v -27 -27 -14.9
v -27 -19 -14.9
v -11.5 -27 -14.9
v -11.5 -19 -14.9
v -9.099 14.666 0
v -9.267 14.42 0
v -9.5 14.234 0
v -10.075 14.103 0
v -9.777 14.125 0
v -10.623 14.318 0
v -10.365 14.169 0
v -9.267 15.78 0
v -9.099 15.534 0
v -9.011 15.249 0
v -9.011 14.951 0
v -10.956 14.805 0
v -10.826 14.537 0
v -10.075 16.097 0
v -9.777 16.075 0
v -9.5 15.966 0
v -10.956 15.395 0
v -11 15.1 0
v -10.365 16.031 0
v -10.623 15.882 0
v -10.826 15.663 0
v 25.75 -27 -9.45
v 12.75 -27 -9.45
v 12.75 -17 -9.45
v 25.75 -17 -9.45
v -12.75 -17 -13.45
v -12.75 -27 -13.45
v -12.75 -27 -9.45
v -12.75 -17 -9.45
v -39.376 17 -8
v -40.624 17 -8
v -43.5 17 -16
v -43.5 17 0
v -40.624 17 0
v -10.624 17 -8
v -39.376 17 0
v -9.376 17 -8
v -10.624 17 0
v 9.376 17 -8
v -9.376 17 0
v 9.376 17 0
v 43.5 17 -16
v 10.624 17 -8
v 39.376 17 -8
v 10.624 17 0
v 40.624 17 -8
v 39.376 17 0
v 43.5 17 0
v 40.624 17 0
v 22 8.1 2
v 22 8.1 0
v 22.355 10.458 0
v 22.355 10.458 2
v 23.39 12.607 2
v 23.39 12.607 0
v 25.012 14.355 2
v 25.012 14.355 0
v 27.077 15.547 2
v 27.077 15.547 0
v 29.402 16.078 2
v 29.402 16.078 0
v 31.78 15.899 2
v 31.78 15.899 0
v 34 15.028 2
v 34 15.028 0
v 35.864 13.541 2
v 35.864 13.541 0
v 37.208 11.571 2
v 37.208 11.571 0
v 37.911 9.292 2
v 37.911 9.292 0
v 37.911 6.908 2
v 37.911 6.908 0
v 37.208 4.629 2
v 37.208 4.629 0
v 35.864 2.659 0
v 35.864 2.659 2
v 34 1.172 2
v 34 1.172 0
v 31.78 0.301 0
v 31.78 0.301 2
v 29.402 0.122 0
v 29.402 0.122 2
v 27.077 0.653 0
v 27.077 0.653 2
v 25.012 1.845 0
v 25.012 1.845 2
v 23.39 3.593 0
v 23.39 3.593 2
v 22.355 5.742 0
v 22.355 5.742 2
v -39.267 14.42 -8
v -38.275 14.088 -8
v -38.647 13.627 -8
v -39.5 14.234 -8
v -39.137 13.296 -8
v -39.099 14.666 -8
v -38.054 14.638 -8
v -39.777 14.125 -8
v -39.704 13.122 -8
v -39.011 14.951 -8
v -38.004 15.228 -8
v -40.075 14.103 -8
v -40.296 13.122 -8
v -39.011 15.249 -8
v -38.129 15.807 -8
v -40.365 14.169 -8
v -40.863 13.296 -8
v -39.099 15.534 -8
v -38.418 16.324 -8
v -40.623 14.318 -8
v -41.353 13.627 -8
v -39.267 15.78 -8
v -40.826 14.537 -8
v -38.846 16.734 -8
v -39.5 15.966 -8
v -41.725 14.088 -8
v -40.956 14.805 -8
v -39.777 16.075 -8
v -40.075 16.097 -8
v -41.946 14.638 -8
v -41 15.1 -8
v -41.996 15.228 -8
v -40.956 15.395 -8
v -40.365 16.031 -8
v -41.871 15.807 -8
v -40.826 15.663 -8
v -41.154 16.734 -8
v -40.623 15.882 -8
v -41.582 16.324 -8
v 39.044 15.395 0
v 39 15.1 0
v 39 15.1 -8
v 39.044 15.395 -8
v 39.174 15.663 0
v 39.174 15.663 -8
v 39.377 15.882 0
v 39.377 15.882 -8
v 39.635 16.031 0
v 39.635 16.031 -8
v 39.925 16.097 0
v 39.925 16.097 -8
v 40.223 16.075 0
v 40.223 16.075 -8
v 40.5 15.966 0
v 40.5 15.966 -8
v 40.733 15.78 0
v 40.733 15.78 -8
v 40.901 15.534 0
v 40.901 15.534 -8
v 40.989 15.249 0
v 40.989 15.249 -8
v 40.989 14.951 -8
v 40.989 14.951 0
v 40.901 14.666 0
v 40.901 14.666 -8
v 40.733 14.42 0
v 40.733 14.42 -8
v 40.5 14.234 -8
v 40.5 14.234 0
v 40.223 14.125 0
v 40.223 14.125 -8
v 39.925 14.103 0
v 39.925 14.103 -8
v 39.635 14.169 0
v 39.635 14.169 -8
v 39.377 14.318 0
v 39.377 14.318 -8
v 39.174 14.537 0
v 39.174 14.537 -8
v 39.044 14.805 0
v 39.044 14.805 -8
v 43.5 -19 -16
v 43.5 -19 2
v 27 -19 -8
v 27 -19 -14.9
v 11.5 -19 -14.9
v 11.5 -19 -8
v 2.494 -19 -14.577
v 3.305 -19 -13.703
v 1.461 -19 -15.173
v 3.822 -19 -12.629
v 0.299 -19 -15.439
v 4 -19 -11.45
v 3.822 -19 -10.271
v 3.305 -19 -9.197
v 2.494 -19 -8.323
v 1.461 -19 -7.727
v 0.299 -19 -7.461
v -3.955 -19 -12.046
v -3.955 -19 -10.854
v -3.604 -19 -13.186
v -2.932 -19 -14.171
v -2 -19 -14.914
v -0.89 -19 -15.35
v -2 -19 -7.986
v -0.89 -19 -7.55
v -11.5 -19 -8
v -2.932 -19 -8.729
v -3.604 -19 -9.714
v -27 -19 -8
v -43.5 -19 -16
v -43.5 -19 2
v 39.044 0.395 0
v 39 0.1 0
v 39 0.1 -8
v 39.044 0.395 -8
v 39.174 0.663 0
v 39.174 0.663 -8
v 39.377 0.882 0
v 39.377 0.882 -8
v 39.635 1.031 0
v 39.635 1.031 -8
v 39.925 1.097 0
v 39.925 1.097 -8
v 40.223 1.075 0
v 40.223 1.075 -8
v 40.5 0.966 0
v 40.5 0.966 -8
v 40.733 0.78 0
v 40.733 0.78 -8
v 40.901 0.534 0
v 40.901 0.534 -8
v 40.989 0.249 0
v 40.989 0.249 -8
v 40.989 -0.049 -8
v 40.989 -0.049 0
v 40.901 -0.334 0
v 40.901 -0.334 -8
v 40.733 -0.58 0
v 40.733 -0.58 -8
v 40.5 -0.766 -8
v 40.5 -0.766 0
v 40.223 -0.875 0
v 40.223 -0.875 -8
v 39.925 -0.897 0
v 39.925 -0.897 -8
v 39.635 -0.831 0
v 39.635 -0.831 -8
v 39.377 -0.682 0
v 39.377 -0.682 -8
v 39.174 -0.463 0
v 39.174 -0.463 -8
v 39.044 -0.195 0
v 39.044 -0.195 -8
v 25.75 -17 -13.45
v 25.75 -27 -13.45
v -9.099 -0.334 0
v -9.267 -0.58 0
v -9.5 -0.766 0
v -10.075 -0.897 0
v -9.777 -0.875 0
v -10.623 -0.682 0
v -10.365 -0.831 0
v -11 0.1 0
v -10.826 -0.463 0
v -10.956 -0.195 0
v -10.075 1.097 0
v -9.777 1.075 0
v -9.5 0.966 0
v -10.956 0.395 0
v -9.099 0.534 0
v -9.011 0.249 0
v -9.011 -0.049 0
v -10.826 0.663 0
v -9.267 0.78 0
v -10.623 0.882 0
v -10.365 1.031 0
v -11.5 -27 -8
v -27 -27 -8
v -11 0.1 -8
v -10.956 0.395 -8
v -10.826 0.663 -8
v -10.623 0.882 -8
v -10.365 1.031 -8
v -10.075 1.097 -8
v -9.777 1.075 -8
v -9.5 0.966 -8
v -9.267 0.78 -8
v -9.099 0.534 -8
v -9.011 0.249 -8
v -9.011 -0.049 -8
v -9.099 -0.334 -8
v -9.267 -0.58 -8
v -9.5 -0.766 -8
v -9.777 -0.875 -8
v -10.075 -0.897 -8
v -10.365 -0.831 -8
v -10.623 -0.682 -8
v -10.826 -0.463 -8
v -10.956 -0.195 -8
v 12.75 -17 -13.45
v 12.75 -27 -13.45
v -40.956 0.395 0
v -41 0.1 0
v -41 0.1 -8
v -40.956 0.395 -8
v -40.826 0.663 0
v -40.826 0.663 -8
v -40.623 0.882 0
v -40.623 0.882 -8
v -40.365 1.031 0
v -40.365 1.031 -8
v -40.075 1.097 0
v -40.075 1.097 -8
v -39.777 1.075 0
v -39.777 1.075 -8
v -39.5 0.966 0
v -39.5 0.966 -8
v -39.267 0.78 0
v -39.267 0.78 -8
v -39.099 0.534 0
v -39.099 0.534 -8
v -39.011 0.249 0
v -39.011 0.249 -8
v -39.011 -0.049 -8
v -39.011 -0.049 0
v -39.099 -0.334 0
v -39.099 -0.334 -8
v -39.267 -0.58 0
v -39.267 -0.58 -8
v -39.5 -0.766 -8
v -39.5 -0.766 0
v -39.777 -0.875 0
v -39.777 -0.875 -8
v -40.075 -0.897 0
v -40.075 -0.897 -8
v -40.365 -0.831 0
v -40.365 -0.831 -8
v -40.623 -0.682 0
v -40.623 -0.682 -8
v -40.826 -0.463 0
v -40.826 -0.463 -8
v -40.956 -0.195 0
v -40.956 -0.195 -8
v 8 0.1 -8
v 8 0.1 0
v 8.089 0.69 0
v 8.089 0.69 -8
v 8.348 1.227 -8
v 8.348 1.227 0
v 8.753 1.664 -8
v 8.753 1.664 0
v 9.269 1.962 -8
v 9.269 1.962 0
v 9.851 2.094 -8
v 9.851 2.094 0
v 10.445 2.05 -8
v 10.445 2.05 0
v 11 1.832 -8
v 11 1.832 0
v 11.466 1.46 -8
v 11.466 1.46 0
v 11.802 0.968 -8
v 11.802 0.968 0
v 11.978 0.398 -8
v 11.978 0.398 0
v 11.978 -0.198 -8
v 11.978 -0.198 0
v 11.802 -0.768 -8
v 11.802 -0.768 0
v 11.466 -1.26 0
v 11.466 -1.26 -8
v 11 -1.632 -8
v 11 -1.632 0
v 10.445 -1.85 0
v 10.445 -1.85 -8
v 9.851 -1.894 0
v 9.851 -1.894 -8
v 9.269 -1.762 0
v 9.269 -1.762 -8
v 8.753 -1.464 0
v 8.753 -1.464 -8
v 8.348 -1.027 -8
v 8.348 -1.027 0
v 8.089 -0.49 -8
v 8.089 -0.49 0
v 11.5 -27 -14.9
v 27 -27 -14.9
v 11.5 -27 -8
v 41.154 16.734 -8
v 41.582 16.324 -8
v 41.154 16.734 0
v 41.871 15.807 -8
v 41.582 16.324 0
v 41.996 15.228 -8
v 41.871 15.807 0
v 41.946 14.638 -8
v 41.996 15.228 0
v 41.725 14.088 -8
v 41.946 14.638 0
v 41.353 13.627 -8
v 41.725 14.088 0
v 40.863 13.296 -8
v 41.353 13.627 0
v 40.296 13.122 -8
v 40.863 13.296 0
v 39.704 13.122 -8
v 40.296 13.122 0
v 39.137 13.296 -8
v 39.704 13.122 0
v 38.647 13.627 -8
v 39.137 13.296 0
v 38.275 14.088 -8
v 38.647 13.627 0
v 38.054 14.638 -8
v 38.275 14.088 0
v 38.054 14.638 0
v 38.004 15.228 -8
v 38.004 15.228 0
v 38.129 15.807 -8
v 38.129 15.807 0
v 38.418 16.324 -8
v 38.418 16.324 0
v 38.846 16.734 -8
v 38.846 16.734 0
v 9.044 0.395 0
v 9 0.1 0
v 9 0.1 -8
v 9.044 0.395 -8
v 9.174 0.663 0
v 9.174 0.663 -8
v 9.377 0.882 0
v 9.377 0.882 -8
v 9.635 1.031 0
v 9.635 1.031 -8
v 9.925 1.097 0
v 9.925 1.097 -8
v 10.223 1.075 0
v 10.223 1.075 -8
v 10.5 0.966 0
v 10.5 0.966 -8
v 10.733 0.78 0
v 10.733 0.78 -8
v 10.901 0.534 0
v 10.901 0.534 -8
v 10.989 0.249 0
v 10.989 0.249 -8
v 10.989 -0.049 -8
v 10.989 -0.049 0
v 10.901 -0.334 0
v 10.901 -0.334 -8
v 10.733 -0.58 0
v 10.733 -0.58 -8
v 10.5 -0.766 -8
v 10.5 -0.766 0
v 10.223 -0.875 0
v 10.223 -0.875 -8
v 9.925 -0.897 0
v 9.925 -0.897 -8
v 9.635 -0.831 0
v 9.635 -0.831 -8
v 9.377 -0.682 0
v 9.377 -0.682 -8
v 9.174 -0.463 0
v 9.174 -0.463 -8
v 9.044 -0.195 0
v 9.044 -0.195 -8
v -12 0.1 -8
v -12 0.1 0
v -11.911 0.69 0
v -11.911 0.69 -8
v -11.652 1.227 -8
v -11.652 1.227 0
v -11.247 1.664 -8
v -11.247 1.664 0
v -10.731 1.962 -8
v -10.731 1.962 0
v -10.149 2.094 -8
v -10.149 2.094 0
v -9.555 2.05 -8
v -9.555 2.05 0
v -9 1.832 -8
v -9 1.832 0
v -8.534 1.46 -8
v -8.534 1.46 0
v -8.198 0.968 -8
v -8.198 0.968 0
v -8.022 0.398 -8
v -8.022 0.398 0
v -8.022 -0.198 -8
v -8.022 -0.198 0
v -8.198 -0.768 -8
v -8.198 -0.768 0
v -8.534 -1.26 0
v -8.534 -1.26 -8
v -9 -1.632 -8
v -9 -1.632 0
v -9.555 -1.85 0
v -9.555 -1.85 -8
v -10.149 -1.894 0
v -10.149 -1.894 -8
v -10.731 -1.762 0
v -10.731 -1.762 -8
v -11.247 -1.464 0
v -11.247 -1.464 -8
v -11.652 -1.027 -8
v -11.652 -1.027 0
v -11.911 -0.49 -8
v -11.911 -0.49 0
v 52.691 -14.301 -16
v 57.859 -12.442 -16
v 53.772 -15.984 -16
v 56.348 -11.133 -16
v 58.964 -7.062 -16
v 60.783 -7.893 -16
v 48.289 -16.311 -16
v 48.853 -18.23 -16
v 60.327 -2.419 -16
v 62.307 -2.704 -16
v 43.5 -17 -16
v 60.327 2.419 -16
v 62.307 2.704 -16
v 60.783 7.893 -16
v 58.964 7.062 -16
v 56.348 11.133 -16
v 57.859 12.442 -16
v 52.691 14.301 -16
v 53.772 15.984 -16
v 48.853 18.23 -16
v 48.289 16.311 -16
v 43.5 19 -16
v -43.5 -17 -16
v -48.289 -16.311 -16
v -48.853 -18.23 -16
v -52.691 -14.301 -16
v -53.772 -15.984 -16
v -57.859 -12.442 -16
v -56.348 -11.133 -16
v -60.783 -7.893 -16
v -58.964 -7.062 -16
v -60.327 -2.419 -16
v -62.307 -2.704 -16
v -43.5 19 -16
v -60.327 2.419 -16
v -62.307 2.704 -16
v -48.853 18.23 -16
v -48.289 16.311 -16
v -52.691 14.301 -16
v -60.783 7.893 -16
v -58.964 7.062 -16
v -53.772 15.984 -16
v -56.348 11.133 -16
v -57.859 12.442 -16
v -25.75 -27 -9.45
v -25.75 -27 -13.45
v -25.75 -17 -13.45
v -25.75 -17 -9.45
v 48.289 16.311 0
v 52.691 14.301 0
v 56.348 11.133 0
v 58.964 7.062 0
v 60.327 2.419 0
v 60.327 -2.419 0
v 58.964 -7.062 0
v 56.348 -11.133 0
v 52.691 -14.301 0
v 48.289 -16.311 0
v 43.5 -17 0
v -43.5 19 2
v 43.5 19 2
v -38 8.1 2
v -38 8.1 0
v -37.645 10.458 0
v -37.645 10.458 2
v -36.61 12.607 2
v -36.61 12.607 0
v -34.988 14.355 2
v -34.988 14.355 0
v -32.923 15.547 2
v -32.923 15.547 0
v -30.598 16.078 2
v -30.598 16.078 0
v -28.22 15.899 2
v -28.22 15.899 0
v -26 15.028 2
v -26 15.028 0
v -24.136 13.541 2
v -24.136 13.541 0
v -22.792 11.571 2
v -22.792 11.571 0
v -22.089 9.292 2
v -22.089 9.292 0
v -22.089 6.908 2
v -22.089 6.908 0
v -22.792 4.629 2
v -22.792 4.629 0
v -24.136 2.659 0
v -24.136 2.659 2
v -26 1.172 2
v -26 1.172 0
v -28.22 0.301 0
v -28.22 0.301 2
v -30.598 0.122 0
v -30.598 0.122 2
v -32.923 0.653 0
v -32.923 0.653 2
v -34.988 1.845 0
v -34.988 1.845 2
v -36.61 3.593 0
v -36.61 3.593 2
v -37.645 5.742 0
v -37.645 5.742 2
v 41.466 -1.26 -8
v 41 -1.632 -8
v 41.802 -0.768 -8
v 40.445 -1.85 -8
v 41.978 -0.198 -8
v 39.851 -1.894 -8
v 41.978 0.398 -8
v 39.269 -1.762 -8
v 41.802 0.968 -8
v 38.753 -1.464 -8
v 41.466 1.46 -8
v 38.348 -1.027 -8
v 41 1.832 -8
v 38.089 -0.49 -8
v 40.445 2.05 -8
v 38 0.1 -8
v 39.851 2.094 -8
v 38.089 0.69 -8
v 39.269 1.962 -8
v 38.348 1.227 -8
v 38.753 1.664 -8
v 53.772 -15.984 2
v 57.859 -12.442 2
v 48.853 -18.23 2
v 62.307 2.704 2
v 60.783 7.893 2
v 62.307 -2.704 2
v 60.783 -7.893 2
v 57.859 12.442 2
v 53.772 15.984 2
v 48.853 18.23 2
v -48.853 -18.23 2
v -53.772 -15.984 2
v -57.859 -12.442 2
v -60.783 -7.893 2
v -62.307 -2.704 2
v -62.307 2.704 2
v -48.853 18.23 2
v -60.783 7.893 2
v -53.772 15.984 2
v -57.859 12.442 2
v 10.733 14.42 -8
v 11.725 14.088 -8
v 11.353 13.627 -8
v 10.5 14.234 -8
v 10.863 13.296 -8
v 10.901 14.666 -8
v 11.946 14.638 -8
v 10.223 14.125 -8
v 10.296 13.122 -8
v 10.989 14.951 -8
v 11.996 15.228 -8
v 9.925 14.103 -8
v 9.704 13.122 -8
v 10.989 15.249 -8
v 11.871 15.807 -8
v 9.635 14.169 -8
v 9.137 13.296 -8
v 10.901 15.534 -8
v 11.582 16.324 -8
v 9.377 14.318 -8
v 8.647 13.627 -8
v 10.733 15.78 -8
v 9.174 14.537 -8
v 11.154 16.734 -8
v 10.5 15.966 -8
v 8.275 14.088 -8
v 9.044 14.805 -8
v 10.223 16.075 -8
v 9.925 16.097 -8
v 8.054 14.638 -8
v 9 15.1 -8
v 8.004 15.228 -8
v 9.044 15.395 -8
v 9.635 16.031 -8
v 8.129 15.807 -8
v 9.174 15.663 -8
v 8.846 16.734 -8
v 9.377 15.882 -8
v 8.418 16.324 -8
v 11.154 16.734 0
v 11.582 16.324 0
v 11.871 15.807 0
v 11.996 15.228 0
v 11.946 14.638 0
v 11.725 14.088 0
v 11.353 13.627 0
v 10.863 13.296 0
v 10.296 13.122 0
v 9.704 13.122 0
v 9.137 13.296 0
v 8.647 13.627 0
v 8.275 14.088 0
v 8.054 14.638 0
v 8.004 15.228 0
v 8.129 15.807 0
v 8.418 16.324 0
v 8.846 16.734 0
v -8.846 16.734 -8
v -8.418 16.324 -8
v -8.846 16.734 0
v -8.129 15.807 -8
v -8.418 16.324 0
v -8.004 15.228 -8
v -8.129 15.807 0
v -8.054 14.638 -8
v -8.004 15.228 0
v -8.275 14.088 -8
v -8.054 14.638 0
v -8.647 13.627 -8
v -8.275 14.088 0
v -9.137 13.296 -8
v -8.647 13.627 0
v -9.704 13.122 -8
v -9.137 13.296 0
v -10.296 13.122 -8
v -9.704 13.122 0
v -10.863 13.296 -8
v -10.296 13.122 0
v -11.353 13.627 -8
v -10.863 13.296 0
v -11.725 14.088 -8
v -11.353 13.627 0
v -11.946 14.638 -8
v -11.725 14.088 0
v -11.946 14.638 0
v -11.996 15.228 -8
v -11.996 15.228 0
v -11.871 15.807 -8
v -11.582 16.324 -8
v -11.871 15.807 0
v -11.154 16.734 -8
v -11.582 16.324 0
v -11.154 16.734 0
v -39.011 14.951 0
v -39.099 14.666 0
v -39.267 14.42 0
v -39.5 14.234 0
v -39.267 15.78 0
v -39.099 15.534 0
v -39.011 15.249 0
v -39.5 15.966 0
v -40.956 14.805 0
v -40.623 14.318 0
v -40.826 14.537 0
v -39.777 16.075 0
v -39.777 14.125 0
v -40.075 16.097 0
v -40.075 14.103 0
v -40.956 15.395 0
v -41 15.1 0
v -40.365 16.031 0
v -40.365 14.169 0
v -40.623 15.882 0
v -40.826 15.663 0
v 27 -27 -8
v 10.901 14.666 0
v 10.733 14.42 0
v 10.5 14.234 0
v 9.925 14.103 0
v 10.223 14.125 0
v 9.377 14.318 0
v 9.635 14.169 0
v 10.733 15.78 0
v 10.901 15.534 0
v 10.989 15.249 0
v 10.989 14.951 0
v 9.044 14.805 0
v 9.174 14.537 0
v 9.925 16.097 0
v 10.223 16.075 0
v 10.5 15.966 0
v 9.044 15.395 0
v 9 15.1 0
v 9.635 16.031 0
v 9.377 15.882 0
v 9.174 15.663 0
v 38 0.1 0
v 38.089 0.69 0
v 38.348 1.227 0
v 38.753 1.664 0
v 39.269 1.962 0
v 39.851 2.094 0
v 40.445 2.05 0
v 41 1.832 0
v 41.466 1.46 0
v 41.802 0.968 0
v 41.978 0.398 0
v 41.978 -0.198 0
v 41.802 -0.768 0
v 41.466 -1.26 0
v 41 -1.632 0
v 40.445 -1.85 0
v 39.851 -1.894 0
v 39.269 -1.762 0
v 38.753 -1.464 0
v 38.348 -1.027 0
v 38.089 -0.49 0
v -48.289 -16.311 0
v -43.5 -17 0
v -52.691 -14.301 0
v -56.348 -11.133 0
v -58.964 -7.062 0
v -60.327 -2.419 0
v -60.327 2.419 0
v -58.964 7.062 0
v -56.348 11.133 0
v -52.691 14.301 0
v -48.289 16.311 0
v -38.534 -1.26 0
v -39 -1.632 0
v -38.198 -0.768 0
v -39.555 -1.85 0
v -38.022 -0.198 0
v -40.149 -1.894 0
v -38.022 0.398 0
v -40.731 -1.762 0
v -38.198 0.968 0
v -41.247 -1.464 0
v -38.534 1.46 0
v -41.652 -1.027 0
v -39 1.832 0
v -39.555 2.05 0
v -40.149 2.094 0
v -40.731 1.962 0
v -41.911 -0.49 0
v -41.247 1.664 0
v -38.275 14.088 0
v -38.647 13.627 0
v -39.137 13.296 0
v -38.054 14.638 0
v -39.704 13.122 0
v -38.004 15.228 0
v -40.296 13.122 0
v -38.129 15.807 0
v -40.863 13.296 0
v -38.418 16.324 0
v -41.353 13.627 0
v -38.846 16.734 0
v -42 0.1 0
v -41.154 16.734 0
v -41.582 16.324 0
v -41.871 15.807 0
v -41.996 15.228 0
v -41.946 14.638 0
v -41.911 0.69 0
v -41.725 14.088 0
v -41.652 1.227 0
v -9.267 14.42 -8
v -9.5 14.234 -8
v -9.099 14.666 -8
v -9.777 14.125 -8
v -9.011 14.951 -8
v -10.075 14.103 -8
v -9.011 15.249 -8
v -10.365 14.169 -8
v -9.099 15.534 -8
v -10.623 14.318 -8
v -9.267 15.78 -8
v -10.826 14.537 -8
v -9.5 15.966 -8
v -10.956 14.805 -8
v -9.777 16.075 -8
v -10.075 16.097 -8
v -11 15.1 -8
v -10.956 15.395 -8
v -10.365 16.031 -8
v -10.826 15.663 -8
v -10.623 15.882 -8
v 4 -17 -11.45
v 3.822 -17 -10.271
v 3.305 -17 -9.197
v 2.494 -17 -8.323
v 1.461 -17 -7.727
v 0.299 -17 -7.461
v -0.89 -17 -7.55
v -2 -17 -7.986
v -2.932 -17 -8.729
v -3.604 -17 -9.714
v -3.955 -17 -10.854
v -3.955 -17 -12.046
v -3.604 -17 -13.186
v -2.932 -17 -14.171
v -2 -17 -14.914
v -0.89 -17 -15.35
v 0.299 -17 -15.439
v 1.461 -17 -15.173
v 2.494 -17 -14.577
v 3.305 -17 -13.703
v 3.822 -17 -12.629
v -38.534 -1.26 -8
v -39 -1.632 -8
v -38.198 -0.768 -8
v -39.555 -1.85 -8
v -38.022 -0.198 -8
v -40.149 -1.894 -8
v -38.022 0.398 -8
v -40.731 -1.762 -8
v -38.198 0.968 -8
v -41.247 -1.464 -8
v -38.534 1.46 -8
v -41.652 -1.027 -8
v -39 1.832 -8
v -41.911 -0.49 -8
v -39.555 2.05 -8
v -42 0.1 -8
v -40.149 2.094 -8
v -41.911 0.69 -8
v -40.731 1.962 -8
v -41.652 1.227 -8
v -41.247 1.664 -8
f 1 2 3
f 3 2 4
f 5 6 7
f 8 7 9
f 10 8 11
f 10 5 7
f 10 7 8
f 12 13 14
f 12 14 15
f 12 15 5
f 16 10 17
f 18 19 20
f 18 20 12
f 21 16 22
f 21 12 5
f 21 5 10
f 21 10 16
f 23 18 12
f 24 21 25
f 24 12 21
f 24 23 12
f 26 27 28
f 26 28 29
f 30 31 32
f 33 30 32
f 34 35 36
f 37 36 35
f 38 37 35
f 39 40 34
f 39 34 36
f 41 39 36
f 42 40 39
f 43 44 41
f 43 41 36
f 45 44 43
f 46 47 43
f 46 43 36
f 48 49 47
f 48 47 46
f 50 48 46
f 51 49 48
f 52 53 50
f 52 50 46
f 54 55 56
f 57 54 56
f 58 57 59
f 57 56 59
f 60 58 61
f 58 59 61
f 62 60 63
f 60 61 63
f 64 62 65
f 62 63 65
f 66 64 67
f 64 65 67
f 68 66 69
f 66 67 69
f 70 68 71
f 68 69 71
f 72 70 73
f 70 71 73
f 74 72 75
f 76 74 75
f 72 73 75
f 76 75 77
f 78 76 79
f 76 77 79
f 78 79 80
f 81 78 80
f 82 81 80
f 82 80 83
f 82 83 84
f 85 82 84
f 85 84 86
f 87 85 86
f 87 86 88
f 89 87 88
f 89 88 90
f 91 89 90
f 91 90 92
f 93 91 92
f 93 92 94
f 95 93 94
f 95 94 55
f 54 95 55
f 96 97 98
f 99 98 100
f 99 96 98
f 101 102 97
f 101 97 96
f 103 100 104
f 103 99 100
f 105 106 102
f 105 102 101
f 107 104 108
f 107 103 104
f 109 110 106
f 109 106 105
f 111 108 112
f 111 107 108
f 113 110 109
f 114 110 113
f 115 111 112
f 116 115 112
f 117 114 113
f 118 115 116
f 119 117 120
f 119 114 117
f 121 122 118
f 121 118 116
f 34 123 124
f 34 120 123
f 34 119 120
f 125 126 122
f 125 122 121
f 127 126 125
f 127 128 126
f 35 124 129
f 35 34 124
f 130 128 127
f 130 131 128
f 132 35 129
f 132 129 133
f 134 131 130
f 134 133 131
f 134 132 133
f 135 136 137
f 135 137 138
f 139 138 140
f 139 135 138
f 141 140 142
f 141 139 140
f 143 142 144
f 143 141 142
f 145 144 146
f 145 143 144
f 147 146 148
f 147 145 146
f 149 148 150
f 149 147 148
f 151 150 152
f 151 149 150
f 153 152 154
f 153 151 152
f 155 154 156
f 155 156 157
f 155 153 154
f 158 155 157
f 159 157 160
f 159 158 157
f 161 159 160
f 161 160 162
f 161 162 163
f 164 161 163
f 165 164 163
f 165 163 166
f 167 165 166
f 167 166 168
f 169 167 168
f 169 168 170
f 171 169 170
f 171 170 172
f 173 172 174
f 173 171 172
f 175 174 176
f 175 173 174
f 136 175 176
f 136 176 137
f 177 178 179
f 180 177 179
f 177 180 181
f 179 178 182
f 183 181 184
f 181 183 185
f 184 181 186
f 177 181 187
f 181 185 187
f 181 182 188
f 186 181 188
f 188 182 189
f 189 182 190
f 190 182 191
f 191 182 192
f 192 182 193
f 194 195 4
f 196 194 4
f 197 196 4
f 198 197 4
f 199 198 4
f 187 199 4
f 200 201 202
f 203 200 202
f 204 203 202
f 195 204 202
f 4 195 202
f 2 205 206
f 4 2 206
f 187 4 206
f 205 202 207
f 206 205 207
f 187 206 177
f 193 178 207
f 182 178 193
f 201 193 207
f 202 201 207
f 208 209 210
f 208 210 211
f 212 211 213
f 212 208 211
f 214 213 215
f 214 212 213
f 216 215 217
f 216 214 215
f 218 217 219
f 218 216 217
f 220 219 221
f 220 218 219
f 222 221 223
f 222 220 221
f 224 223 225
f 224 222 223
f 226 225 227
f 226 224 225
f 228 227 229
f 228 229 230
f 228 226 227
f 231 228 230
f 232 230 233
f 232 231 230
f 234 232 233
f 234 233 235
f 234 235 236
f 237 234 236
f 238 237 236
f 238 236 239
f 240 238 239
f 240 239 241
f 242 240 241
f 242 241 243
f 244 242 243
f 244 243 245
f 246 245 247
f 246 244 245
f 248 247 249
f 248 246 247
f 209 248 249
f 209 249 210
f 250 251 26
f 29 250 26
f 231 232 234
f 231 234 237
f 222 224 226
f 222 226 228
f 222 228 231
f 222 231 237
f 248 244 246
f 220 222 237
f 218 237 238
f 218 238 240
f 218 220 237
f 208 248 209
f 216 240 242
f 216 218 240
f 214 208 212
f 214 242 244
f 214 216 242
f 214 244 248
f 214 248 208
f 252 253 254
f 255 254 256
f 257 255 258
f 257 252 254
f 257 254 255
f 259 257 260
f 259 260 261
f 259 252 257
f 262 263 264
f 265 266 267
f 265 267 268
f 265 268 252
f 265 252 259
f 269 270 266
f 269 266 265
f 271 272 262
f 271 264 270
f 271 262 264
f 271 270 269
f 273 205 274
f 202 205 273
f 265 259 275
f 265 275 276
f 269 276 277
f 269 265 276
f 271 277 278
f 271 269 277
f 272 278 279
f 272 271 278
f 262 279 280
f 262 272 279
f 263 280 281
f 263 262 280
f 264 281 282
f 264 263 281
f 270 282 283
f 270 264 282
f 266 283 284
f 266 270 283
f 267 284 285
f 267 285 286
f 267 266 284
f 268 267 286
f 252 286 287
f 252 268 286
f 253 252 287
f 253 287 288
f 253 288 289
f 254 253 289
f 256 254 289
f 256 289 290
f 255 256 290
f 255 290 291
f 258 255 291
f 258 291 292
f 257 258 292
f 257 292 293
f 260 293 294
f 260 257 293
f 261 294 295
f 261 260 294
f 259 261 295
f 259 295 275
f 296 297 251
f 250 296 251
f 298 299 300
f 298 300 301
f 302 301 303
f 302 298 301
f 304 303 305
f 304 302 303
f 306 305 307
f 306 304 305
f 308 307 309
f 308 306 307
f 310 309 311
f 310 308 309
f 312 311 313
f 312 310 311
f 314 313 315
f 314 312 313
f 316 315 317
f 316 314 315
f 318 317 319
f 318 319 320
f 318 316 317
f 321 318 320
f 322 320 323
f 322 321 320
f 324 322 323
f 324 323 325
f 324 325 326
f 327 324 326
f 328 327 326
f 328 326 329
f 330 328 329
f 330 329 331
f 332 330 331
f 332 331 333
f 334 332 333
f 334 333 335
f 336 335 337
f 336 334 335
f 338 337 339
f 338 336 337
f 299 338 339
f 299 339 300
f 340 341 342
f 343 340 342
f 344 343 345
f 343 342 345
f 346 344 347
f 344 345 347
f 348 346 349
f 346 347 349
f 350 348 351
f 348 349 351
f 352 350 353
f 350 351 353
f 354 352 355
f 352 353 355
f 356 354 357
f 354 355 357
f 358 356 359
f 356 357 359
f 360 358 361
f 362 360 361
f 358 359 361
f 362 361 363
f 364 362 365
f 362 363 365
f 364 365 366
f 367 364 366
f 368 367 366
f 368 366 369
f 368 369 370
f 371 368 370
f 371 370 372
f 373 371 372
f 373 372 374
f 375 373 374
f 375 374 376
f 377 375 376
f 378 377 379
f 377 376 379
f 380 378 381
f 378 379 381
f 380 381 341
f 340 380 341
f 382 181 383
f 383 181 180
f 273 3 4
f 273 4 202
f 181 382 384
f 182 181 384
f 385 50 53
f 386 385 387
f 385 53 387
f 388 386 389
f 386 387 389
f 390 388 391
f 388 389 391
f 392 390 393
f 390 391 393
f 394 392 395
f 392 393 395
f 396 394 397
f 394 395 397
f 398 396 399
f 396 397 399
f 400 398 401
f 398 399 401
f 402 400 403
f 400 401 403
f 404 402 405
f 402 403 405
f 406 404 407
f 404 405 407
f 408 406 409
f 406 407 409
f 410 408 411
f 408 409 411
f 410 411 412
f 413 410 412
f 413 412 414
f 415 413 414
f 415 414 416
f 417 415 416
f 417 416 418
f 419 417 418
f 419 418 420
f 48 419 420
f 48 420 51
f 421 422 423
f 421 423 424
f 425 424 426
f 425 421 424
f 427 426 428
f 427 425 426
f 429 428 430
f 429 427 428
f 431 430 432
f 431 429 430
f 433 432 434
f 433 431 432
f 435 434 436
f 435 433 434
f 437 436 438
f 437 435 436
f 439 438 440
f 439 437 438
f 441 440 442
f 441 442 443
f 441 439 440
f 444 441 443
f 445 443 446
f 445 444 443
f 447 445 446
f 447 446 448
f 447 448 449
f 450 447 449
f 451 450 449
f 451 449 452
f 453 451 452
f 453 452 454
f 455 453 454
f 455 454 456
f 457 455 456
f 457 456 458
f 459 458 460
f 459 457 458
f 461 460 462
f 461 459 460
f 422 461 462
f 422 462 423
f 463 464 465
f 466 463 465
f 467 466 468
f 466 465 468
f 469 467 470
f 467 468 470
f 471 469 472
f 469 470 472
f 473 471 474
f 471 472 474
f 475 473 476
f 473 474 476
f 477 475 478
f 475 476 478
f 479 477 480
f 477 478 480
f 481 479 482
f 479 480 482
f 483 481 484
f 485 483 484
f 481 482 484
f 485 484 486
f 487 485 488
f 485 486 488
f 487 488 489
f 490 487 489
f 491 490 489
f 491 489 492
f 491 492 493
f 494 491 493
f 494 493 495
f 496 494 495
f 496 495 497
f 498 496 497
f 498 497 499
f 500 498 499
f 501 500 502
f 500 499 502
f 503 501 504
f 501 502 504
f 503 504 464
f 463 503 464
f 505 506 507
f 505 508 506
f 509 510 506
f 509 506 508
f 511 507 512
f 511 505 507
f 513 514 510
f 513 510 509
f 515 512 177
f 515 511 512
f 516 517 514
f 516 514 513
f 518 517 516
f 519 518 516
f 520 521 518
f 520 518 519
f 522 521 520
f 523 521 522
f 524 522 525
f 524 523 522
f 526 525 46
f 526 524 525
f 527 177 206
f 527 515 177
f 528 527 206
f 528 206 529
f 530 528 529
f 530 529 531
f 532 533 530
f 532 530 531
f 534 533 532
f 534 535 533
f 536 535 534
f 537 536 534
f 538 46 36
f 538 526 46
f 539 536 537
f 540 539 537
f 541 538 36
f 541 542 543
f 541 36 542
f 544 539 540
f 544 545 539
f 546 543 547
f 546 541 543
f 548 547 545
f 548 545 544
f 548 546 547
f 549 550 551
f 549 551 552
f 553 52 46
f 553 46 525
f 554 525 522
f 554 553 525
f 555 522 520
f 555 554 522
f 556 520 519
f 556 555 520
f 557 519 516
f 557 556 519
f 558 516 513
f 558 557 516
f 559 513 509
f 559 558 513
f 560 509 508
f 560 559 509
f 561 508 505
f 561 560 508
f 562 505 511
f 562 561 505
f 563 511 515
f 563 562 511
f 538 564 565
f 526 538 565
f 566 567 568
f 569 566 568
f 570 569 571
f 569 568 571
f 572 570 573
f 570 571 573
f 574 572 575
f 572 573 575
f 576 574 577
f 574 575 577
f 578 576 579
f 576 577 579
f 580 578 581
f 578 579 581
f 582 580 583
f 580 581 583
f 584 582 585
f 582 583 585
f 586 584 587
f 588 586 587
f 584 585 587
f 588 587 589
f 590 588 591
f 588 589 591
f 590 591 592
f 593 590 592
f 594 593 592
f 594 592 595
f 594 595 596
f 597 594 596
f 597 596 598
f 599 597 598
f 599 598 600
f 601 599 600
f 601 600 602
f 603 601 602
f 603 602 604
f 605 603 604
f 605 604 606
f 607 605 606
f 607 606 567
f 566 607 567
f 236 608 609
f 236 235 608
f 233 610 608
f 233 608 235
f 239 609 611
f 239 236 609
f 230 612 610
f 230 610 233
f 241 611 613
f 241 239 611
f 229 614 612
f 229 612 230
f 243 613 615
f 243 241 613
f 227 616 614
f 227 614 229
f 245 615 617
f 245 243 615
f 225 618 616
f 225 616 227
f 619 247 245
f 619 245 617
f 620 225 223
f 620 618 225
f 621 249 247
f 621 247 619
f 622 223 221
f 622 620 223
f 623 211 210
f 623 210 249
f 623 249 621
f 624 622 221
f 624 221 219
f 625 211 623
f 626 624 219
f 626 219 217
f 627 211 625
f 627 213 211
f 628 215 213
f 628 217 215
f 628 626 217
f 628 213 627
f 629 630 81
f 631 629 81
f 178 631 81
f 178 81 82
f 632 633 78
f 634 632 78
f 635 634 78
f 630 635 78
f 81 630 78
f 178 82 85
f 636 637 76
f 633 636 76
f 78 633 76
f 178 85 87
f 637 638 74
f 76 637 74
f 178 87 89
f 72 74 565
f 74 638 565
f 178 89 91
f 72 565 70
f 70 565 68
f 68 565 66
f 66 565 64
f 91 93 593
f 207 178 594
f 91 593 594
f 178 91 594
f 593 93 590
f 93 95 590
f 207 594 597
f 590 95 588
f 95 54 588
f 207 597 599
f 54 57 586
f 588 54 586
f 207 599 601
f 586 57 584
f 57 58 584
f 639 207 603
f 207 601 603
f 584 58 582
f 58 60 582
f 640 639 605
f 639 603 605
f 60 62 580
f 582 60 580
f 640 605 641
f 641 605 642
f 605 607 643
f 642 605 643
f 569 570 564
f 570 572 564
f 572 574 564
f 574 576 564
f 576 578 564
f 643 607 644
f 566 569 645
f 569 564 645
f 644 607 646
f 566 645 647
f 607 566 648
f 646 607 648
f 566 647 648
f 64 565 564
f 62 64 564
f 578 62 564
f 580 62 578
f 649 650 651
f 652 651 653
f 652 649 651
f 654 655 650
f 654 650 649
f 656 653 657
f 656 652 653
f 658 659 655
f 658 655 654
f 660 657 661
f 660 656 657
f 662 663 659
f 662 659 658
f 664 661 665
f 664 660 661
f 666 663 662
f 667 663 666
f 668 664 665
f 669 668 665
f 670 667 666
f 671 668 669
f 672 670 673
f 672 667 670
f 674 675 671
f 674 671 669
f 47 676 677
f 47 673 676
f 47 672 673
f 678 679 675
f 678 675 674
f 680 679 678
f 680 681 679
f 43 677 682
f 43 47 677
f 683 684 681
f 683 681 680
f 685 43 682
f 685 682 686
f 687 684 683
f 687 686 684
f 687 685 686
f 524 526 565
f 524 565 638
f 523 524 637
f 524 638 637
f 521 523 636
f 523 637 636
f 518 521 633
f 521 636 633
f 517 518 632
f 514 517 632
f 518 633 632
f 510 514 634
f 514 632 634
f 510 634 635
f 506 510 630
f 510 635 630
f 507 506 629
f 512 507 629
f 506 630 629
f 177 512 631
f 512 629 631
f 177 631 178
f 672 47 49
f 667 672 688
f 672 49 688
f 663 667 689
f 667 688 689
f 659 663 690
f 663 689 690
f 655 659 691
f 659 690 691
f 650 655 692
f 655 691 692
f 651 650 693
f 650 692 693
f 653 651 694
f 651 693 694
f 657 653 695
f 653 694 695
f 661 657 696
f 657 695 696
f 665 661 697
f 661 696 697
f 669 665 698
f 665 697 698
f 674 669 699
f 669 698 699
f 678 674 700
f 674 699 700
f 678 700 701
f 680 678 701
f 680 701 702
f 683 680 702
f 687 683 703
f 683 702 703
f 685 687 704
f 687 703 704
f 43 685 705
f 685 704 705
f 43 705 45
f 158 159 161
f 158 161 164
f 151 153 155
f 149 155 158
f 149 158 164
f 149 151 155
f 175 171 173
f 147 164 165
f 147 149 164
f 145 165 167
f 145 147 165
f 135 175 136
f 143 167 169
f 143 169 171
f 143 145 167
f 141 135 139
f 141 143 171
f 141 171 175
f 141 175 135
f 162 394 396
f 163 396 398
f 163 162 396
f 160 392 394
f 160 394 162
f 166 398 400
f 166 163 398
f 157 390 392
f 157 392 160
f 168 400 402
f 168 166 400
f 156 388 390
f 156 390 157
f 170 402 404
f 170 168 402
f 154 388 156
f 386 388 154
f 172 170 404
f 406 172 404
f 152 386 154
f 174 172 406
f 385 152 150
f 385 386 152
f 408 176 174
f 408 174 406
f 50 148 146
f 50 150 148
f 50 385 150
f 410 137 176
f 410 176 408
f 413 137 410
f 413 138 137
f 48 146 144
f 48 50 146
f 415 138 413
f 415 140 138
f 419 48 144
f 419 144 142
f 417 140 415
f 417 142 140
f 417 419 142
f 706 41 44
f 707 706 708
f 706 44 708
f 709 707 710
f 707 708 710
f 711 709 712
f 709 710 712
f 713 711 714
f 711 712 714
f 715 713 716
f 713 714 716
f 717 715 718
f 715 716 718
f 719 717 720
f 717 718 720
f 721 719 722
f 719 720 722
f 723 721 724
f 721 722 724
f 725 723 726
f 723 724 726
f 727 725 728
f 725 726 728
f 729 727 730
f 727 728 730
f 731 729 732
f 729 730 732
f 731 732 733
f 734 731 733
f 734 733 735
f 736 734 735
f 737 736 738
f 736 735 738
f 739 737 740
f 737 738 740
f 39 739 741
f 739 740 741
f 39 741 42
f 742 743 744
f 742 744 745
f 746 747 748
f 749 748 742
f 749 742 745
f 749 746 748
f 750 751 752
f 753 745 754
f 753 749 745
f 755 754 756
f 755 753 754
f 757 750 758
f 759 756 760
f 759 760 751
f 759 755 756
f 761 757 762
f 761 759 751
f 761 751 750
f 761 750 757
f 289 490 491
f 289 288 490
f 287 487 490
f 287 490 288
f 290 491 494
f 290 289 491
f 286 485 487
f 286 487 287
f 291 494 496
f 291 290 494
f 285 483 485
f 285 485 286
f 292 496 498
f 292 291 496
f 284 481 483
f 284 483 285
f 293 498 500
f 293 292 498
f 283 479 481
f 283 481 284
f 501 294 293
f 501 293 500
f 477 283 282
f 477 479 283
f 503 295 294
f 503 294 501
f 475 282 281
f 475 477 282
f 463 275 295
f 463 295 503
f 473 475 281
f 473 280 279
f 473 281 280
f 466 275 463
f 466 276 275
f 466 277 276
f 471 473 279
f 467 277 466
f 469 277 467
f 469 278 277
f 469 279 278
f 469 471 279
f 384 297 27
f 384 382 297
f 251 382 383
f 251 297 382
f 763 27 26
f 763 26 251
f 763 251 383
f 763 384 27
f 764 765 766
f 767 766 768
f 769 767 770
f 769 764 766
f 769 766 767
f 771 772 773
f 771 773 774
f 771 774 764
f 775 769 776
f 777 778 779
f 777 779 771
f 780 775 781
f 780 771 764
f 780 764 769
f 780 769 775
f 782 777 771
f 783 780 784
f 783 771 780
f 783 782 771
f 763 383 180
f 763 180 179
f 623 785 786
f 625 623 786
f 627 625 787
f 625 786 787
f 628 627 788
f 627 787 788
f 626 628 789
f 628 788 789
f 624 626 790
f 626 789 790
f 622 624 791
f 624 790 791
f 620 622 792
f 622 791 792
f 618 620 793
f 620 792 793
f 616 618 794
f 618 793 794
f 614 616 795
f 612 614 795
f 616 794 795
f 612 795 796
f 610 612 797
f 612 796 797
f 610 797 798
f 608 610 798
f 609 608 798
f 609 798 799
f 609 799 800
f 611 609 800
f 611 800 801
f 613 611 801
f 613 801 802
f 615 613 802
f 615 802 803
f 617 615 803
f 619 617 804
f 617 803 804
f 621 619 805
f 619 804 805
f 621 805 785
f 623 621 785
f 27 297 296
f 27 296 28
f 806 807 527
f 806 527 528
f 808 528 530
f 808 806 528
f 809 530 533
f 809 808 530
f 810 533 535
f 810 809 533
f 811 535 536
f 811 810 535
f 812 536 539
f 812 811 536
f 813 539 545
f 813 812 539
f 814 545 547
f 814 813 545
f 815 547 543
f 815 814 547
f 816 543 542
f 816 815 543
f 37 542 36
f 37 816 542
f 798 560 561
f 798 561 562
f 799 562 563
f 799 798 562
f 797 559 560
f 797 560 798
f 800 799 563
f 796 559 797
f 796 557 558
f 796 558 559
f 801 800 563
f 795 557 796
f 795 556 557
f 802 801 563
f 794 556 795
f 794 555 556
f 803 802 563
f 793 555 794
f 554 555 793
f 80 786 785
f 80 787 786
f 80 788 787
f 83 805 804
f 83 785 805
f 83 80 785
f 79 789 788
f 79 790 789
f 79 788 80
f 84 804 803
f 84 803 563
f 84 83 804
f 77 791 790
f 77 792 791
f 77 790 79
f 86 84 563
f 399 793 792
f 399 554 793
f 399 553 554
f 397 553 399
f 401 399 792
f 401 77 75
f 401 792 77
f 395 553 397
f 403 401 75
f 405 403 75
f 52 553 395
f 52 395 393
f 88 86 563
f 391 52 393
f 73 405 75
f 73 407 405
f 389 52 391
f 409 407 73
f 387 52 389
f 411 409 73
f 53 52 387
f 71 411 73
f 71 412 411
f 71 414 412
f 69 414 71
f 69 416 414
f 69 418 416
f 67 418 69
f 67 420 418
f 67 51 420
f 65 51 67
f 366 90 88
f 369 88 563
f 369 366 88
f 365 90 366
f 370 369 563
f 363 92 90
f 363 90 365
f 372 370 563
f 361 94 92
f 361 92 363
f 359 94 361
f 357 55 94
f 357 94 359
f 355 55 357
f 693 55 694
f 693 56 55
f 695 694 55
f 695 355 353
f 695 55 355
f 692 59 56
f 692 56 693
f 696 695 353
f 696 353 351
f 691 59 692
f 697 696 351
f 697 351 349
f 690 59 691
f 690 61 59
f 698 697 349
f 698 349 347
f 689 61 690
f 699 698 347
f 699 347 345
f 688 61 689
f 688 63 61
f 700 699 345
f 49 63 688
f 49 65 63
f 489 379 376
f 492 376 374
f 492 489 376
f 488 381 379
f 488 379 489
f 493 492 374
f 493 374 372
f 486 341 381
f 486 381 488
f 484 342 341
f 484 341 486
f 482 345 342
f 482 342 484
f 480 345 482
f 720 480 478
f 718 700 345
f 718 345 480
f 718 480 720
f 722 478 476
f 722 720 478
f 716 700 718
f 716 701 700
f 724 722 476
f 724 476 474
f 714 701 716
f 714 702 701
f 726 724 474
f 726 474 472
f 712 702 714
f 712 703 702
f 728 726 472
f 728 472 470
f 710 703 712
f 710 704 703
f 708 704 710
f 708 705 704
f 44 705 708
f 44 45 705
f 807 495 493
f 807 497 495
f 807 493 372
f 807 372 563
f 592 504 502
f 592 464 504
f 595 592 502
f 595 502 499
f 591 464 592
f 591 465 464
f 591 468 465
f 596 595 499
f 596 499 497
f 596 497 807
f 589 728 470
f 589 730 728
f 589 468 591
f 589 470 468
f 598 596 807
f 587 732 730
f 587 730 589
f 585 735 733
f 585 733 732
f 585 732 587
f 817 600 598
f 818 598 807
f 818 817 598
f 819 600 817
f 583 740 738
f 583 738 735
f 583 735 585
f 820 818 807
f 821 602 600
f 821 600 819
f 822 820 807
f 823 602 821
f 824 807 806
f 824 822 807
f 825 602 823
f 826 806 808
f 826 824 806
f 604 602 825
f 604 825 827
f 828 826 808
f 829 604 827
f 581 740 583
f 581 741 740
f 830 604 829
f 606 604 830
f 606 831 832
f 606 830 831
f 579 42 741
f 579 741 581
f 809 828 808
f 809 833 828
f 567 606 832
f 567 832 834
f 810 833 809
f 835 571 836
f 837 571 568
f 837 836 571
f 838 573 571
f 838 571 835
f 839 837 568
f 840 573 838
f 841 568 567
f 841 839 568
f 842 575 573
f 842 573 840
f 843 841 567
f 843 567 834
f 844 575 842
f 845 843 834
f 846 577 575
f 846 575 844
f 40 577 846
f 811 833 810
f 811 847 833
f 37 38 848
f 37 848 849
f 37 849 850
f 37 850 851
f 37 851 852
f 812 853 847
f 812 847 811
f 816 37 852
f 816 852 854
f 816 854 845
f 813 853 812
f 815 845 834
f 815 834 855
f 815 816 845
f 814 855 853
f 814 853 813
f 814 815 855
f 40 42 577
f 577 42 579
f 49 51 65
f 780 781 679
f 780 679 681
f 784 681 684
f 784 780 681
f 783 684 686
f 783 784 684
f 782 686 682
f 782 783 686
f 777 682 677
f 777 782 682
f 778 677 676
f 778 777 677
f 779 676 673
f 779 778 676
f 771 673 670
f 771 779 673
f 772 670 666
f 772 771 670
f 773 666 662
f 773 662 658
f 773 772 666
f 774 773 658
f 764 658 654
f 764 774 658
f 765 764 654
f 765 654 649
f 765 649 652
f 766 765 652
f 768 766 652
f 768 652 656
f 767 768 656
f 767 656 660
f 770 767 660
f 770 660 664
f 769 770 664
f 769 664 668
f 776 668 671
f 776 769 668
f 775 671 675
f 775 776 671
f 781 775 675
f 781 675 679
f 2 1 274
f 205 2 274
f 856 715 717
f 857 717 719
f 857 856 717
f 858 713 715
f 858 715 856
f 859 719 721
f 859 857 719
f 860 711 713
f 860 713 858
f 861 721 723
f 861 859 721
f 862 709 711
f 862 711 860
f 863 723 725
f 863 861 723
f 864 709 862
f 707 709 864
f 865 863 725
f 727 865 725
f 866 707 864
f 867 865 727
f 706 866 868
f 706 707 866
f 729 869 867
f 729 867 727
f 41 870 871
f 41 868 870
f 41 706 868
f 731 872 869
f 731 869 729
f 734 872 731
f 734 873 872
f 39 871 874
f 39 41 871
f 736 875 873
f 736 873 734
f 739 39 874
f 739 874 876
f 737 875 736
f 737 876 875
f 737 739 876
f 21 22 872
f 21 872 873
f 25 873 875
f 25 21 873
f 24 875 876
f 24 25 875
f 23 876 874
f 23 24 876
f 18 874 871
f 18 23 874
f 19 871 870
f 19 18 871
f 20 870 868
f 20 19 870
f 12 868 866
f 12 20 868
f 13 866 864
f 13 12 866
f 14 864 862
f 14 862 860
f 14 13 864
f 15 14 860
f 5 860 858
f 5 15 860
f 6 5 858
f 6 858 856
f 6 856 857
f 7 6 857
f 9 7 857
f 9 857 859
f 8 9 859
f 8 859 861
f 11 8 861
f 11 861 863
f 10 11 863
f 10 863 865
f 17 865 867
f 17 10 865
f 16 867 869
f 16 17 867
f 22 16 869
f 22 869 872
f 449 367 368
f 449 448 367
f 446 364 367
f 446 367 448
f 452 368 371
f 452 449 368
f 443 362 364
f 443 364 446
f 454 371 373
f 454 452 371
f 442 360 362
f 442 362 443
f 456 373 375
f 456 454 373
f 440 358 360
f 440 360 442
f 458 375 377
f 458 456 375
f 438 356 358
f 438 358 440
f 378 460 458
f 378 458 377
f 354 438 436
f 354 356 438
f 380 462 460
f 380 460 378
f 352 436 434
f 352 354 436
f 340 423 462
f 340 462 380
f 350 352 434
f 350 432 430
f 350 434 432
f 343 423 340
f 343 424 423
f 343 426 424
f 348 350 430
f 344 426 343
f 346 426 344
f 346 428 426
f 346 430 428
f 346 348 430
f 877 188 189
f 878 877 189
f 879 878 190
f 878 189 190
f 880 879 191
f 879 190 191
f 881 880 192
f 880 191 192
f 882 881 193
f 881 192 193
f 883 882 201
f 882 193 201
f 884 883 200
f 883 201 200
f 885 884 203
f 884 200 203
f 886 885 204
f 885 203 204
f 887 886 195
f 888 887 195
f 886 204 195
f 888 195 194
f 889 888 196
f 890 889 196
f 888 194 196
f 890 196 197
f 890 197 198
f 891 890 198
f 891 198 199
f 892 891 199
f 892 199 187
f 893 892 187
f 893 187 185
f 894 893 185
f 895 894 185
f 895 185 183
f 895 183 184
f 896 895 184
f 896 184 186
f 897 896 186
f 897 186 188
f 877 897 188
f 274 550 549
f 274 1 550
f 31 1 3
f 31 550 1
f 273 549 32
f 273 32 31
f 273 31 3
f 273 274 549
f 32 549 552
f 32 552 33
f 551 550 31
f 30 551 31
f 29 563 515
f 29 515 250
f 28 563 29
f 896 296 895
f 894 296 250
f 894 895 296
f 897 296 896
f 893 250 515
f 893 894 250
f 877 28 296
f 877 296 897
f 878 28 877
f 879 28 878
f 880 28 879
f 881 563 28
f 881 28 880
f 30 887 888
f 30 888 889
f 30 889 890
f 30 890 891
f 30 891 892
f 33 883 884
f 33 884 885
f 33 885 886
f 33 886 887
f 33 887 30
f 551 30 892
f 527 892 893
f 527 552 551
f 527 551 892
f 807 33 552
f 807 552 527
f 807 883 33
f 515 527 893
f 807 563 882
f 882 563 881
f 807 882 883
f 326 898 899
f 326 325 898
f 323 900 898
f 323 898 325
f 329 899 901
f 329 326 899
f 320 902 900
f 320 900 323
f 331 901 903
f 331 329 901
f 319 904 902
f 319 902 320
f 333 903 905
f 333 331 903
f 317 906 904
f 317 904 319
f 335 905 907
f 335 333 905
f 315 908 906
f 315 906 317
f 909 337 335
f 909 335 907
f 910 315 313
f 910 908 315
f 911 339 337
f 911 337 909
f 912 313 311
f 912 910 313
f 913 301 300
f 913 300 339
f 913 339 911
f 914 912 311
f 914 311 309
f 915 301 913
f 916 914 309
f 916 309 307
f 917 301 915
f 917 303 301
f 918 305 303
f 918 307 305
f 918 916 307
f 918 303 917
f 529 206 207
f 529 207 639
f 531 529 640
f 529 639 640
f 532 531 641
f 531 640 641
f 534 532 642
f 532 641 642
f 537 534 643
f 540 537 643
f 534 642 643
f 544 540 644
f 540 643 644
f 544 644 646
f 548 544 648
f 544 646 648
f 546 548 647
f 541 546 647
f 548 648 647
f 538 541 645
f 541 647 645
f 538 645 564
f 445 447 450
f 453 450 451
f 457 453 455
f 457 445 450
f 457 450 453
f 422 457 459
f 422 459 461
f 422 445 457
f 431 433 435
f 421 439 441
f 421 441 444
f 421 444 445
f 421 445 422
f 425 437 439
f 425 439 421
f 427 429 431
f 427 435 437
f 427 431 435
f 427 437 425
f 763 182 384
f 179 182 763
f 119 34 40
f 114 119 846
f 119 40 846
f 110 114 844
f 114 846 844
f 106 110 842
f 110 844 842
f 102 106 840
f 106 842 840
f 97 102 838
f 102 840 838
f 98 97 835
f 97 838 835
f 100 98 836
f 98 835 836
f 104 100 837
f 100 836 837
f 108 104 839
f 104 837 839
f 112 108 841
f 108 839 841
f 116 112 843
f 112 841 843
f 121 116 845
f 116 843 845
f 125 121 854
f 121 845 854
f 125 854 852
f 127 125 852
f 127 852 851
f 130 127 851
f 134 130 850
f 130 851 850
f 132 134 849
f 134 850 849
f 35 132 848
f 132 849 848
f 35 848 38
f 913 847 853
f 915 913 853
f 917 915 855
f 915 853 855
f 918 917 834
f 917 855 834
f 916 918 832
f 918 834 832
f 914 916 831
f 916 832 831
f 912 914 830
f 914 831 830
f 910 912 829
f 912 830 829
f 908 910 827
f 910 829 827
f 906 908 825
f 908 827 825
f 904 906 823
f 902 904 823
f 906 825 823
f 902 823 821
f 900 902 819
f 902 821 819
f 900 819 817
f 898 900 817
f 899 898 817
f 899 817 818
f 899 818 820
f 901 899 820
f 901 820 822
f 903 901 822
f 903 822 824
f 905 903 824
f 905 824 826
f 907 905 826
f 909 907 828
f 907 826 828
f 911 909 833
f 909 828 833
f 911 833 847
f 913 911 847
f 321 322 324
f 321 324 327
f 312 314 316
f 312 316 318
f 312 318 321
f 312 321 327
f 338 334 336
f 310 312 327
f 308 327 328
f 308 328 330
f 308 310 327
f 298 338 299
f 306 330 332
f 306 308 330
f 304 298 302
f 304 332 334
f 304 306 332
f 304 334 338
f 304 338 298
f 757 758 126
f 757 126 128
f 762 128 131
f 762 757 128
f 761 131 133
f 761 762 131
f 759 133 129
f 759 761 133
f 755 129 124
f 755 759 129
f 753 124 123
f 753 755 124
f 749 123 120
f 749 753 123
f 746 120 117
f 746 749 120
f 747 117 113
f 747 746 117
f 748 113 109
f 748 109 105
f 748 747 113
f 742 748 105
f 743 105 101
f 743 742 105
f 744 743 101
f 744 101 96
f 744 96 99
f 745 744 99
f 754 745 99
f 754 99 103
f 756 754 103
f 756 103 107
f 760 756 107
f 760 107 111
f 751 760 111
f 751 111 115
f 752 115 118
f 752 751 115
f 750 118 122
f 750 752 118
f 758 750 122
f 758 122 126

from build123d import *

# Parameters (mm, degrees)
BOSS_EXTRUDE1_DEPTH = 2
BOSS_EXTRUDE2_START = -16
BOSS_EXTRUDE2_DEPTH = 16
SKETCH2_R           = 2
SKETCH2_R_2         = 1
BOSS_EXTRUDE3_DEPTH = 8
SKETCH3_R           = 8
CUT_EXTRUDE1_DEPTH  = 8
SKETCH4_W           = 15.5
SKETCH4_H           = 6.9
SKETCH4_W_2         = 13
SKETCH4_H_2         = 4
BOSS_EXTRUDE4_DEPTH = 8
SKETCH4_2_W         = 13
SKETCH4_2_H         = 4
SKETCH4_2_R         = 4
CUT_EXTRUDE2_DEPTH  = 8


with BuildPart() as part:
    # Sketch1 → Boss-Extrude1 (new body)
    with BuildSketch(Plane.XY):
        with BuildLine():
            Line((43.5, 19), (-43.5, 19))
            ThreePointArc((-43.5, 19), (-62.5, 0), (-43.5, -19))
            Line((-43.5, -19), (43.5, -19))
            ThreePointArc((43.5, -19), (62.5, 0), (43.5, 19))
        make_face()
    extrude(amount=BOSS_EXTRUDE1_DEPTH)

    # Sketch1<3> → Boss-Extrude2 (add)
    with BuildSketch(Plane.XY.offset(BOSS_EXTRUDE2_START)):
        with BuildLine():
            Line((-43.5, 19), (43.5, 19))
            ThreePointArc((43.5, 19), (62.5, 0), (43.5, -19))
            Line((43.5, -19), (-43.5, -19))
            ThreePointArc((-43.5, -19), (-62.5, 0), (-43.5, 19))
        make_face()
        with BuildLine():
            Line((-43.5, 17), (43.5, 17))
            ThreePointArc((43.5, 17), (60.5, 0), (43.5, -17))
            Line((43.5, -17), (-43.5, -17))
            ThreePointArc((-43.5, -17), (-60.5, 0), (-43.5, 17))
        make_face(mode=Mode.SUBTRACT)
    extrude(amount=BOSS_EXTRUDE2_DEPTH)

    # Sketch2 → Boss-Extrude3 (add)
    # profile 1 of 8: a face of its own
    with BuildSketch(Plane(origin=(0, 0, 0), x_dir=(-1, 0, 0), z_dir=(0, 0, -1))):
        with Locations((-40, 15.1)):
            Circle(SKETCH2_R)
        with Locations((-40, 15.1)):
            Circle(SKETCH2_R_2, mode=Mode.SUBTRACT)
    # profile 2 of 8: a face of its own
    with BuildSketch(Plane(origin=(0, 0, 0), x_dir=(-1, 0, 0), z_dir=(0, 0, -1))):
        with Locations((-10, 15.1)):
            Circle(SKETCH2_R)
        with Locations((-10, 15.1)):
            Circle(SKETCH2_R_2, mode=Mode.SUBTRACT)
    # profile 3 of 8: a face of its own
    with BuildSketch(Plane(origin=(0, 0, 0), x_dir=(-1, 0, 0), z_dir=(0, 0, -1))):
        with Locations((-40, 0.1)):
            Circle(SKETCH2_R)
        with Locations((-40, 0.1)):
            Circle(SKETCH2_R_2, mode=Mode.SUBTRACT)
    # profile 4 of 8: a face of its own
    with BuildSketch(Plane(origin=(0, 0, 0), x_dir=(-1, 0, 0), z_dir=(0, 0, -1))):
        with Locations((-10, 0.1)):
            Circle(SKETCH2_R)
        with Locations((-10, 0.1)):
            Circle(SKETCH2_R_2, mode=Mode.SUBTRACT)
    # profile 5 of 8: a face of its own
    with BuildSketch(Plane(origin=(0, 0, 0), x_dir=(-1, 0, 0), z_dir=(0, 0, -1))):
        with Locations((10, 15.1)):
            Circle(SKETCH2_R)
        with Locations((10, 15.1)):
            Circle(SKETCH2_R_2, mode=Mode.SUBTRACT)
    # profile 6 of 8: a face of its own
    with BuildSketch(Plane(origin=(0, 0, 0), x_dir=(-1, 0, 0), z_dir=(0, 0, -1))):
        with Locations((40, 15.1)):
            Circle(SKETCH2_R)
        with Locations((40, 15.1)):
            Circle(SKETCH2_R_2, mode=Mode.SUBTRACT)
    # profile 7 of 8: a face of its own
    with BuildSketch(Plane(origin=(0, 0, 0), x_dir=(-1, 0, 0), z_dir=(0, 0, -1))):
        with Locations((10, 0.1)):
            Circle(SKETCH2_R)
        with Locations((10, 0.1)):
            Circle(SKETCH2_R_2, mode=Mode.SUBTRACT)
    # profile 8 of 8: a face of its own
    with BuildSketch(Plane(origin=(0, 0, 0), x_dir=(-1, 0, 0), z_dir=(0, 0, -1))):
        with Locations((40, 0.1)):
            Circle(SKETCH2_R)
        with Locations((40, 0.1)):
            Circle(SKETCH2_R_2, mode=Mode.SUBTRACT)
    extrude(amount=BOSS_EXTRUDE3_DEPTH)

    # Sketch3 → Cut-Extrude1 (cut)
    with BuildSketch(Plane(origin=(0, 0, 0), x_dir=(-1, 0, 0), z_dir=(0, 0, -1))):
        with Locations((30, 8.1)):
            Circle(SKETCH3_R)
        with Locations((-30, 8.1)):
            Circle(SKETCH3_R)
    extrude(amount=-CUT_EXTRUDE1_DEPTH, mode=Mode.SUBTRACT)

    # Sketch4 → Boss-Extrude4 (add)
    # profile 1 of 2: a face of its own
    with BuildSketch(Plane.XZ.offset(19)):
        with Locations((-19.25, -11.45)):
            Rectangle(SKETCH4_W, SKETCH4_H)
        with Locations((-19.25, -11.45)):
            Rectangle(SKETCH4_W_2, SKETCH4_H_2, mode=Mode.SUBTRACT)
    # profile 2 of 2: a face of its own
    with BuildSketch(Plane.XZ.offset(19)):
        with Locations((19.25, -11.45)):
            Rectangle(SKETCH4_W, SKETCH4_H)
        with Locations((19.25, -11.45)):
            Rectangle(SKETCH4_W_2, SKETCH4_H_2, mode=Mode.SUBTRACT)
    extrude(amount=BOSS_EXTRUDE4_DEPTH)

    # Sketch4<2> → Cut-Extrude2 (cut)
    with BuildSketch(Plane.XZ.offset(19)):
        with Locations((-19.25, -11.45)):
            Rectangle(SKETCH4_2_W, SKETCH4_2_H)
        with Locations((19.25, -11.45)):
            Rectangle(SKETCH4_2_W, SKETCH4_2_H)
        with Locations((0, -11.45)):
            Circle(SKETCH4_2_R)
    extrude(amount=-CUT_EXTRUDE2_DEPTH, mode=Mode.SUBTRACT)


solid = part.part
